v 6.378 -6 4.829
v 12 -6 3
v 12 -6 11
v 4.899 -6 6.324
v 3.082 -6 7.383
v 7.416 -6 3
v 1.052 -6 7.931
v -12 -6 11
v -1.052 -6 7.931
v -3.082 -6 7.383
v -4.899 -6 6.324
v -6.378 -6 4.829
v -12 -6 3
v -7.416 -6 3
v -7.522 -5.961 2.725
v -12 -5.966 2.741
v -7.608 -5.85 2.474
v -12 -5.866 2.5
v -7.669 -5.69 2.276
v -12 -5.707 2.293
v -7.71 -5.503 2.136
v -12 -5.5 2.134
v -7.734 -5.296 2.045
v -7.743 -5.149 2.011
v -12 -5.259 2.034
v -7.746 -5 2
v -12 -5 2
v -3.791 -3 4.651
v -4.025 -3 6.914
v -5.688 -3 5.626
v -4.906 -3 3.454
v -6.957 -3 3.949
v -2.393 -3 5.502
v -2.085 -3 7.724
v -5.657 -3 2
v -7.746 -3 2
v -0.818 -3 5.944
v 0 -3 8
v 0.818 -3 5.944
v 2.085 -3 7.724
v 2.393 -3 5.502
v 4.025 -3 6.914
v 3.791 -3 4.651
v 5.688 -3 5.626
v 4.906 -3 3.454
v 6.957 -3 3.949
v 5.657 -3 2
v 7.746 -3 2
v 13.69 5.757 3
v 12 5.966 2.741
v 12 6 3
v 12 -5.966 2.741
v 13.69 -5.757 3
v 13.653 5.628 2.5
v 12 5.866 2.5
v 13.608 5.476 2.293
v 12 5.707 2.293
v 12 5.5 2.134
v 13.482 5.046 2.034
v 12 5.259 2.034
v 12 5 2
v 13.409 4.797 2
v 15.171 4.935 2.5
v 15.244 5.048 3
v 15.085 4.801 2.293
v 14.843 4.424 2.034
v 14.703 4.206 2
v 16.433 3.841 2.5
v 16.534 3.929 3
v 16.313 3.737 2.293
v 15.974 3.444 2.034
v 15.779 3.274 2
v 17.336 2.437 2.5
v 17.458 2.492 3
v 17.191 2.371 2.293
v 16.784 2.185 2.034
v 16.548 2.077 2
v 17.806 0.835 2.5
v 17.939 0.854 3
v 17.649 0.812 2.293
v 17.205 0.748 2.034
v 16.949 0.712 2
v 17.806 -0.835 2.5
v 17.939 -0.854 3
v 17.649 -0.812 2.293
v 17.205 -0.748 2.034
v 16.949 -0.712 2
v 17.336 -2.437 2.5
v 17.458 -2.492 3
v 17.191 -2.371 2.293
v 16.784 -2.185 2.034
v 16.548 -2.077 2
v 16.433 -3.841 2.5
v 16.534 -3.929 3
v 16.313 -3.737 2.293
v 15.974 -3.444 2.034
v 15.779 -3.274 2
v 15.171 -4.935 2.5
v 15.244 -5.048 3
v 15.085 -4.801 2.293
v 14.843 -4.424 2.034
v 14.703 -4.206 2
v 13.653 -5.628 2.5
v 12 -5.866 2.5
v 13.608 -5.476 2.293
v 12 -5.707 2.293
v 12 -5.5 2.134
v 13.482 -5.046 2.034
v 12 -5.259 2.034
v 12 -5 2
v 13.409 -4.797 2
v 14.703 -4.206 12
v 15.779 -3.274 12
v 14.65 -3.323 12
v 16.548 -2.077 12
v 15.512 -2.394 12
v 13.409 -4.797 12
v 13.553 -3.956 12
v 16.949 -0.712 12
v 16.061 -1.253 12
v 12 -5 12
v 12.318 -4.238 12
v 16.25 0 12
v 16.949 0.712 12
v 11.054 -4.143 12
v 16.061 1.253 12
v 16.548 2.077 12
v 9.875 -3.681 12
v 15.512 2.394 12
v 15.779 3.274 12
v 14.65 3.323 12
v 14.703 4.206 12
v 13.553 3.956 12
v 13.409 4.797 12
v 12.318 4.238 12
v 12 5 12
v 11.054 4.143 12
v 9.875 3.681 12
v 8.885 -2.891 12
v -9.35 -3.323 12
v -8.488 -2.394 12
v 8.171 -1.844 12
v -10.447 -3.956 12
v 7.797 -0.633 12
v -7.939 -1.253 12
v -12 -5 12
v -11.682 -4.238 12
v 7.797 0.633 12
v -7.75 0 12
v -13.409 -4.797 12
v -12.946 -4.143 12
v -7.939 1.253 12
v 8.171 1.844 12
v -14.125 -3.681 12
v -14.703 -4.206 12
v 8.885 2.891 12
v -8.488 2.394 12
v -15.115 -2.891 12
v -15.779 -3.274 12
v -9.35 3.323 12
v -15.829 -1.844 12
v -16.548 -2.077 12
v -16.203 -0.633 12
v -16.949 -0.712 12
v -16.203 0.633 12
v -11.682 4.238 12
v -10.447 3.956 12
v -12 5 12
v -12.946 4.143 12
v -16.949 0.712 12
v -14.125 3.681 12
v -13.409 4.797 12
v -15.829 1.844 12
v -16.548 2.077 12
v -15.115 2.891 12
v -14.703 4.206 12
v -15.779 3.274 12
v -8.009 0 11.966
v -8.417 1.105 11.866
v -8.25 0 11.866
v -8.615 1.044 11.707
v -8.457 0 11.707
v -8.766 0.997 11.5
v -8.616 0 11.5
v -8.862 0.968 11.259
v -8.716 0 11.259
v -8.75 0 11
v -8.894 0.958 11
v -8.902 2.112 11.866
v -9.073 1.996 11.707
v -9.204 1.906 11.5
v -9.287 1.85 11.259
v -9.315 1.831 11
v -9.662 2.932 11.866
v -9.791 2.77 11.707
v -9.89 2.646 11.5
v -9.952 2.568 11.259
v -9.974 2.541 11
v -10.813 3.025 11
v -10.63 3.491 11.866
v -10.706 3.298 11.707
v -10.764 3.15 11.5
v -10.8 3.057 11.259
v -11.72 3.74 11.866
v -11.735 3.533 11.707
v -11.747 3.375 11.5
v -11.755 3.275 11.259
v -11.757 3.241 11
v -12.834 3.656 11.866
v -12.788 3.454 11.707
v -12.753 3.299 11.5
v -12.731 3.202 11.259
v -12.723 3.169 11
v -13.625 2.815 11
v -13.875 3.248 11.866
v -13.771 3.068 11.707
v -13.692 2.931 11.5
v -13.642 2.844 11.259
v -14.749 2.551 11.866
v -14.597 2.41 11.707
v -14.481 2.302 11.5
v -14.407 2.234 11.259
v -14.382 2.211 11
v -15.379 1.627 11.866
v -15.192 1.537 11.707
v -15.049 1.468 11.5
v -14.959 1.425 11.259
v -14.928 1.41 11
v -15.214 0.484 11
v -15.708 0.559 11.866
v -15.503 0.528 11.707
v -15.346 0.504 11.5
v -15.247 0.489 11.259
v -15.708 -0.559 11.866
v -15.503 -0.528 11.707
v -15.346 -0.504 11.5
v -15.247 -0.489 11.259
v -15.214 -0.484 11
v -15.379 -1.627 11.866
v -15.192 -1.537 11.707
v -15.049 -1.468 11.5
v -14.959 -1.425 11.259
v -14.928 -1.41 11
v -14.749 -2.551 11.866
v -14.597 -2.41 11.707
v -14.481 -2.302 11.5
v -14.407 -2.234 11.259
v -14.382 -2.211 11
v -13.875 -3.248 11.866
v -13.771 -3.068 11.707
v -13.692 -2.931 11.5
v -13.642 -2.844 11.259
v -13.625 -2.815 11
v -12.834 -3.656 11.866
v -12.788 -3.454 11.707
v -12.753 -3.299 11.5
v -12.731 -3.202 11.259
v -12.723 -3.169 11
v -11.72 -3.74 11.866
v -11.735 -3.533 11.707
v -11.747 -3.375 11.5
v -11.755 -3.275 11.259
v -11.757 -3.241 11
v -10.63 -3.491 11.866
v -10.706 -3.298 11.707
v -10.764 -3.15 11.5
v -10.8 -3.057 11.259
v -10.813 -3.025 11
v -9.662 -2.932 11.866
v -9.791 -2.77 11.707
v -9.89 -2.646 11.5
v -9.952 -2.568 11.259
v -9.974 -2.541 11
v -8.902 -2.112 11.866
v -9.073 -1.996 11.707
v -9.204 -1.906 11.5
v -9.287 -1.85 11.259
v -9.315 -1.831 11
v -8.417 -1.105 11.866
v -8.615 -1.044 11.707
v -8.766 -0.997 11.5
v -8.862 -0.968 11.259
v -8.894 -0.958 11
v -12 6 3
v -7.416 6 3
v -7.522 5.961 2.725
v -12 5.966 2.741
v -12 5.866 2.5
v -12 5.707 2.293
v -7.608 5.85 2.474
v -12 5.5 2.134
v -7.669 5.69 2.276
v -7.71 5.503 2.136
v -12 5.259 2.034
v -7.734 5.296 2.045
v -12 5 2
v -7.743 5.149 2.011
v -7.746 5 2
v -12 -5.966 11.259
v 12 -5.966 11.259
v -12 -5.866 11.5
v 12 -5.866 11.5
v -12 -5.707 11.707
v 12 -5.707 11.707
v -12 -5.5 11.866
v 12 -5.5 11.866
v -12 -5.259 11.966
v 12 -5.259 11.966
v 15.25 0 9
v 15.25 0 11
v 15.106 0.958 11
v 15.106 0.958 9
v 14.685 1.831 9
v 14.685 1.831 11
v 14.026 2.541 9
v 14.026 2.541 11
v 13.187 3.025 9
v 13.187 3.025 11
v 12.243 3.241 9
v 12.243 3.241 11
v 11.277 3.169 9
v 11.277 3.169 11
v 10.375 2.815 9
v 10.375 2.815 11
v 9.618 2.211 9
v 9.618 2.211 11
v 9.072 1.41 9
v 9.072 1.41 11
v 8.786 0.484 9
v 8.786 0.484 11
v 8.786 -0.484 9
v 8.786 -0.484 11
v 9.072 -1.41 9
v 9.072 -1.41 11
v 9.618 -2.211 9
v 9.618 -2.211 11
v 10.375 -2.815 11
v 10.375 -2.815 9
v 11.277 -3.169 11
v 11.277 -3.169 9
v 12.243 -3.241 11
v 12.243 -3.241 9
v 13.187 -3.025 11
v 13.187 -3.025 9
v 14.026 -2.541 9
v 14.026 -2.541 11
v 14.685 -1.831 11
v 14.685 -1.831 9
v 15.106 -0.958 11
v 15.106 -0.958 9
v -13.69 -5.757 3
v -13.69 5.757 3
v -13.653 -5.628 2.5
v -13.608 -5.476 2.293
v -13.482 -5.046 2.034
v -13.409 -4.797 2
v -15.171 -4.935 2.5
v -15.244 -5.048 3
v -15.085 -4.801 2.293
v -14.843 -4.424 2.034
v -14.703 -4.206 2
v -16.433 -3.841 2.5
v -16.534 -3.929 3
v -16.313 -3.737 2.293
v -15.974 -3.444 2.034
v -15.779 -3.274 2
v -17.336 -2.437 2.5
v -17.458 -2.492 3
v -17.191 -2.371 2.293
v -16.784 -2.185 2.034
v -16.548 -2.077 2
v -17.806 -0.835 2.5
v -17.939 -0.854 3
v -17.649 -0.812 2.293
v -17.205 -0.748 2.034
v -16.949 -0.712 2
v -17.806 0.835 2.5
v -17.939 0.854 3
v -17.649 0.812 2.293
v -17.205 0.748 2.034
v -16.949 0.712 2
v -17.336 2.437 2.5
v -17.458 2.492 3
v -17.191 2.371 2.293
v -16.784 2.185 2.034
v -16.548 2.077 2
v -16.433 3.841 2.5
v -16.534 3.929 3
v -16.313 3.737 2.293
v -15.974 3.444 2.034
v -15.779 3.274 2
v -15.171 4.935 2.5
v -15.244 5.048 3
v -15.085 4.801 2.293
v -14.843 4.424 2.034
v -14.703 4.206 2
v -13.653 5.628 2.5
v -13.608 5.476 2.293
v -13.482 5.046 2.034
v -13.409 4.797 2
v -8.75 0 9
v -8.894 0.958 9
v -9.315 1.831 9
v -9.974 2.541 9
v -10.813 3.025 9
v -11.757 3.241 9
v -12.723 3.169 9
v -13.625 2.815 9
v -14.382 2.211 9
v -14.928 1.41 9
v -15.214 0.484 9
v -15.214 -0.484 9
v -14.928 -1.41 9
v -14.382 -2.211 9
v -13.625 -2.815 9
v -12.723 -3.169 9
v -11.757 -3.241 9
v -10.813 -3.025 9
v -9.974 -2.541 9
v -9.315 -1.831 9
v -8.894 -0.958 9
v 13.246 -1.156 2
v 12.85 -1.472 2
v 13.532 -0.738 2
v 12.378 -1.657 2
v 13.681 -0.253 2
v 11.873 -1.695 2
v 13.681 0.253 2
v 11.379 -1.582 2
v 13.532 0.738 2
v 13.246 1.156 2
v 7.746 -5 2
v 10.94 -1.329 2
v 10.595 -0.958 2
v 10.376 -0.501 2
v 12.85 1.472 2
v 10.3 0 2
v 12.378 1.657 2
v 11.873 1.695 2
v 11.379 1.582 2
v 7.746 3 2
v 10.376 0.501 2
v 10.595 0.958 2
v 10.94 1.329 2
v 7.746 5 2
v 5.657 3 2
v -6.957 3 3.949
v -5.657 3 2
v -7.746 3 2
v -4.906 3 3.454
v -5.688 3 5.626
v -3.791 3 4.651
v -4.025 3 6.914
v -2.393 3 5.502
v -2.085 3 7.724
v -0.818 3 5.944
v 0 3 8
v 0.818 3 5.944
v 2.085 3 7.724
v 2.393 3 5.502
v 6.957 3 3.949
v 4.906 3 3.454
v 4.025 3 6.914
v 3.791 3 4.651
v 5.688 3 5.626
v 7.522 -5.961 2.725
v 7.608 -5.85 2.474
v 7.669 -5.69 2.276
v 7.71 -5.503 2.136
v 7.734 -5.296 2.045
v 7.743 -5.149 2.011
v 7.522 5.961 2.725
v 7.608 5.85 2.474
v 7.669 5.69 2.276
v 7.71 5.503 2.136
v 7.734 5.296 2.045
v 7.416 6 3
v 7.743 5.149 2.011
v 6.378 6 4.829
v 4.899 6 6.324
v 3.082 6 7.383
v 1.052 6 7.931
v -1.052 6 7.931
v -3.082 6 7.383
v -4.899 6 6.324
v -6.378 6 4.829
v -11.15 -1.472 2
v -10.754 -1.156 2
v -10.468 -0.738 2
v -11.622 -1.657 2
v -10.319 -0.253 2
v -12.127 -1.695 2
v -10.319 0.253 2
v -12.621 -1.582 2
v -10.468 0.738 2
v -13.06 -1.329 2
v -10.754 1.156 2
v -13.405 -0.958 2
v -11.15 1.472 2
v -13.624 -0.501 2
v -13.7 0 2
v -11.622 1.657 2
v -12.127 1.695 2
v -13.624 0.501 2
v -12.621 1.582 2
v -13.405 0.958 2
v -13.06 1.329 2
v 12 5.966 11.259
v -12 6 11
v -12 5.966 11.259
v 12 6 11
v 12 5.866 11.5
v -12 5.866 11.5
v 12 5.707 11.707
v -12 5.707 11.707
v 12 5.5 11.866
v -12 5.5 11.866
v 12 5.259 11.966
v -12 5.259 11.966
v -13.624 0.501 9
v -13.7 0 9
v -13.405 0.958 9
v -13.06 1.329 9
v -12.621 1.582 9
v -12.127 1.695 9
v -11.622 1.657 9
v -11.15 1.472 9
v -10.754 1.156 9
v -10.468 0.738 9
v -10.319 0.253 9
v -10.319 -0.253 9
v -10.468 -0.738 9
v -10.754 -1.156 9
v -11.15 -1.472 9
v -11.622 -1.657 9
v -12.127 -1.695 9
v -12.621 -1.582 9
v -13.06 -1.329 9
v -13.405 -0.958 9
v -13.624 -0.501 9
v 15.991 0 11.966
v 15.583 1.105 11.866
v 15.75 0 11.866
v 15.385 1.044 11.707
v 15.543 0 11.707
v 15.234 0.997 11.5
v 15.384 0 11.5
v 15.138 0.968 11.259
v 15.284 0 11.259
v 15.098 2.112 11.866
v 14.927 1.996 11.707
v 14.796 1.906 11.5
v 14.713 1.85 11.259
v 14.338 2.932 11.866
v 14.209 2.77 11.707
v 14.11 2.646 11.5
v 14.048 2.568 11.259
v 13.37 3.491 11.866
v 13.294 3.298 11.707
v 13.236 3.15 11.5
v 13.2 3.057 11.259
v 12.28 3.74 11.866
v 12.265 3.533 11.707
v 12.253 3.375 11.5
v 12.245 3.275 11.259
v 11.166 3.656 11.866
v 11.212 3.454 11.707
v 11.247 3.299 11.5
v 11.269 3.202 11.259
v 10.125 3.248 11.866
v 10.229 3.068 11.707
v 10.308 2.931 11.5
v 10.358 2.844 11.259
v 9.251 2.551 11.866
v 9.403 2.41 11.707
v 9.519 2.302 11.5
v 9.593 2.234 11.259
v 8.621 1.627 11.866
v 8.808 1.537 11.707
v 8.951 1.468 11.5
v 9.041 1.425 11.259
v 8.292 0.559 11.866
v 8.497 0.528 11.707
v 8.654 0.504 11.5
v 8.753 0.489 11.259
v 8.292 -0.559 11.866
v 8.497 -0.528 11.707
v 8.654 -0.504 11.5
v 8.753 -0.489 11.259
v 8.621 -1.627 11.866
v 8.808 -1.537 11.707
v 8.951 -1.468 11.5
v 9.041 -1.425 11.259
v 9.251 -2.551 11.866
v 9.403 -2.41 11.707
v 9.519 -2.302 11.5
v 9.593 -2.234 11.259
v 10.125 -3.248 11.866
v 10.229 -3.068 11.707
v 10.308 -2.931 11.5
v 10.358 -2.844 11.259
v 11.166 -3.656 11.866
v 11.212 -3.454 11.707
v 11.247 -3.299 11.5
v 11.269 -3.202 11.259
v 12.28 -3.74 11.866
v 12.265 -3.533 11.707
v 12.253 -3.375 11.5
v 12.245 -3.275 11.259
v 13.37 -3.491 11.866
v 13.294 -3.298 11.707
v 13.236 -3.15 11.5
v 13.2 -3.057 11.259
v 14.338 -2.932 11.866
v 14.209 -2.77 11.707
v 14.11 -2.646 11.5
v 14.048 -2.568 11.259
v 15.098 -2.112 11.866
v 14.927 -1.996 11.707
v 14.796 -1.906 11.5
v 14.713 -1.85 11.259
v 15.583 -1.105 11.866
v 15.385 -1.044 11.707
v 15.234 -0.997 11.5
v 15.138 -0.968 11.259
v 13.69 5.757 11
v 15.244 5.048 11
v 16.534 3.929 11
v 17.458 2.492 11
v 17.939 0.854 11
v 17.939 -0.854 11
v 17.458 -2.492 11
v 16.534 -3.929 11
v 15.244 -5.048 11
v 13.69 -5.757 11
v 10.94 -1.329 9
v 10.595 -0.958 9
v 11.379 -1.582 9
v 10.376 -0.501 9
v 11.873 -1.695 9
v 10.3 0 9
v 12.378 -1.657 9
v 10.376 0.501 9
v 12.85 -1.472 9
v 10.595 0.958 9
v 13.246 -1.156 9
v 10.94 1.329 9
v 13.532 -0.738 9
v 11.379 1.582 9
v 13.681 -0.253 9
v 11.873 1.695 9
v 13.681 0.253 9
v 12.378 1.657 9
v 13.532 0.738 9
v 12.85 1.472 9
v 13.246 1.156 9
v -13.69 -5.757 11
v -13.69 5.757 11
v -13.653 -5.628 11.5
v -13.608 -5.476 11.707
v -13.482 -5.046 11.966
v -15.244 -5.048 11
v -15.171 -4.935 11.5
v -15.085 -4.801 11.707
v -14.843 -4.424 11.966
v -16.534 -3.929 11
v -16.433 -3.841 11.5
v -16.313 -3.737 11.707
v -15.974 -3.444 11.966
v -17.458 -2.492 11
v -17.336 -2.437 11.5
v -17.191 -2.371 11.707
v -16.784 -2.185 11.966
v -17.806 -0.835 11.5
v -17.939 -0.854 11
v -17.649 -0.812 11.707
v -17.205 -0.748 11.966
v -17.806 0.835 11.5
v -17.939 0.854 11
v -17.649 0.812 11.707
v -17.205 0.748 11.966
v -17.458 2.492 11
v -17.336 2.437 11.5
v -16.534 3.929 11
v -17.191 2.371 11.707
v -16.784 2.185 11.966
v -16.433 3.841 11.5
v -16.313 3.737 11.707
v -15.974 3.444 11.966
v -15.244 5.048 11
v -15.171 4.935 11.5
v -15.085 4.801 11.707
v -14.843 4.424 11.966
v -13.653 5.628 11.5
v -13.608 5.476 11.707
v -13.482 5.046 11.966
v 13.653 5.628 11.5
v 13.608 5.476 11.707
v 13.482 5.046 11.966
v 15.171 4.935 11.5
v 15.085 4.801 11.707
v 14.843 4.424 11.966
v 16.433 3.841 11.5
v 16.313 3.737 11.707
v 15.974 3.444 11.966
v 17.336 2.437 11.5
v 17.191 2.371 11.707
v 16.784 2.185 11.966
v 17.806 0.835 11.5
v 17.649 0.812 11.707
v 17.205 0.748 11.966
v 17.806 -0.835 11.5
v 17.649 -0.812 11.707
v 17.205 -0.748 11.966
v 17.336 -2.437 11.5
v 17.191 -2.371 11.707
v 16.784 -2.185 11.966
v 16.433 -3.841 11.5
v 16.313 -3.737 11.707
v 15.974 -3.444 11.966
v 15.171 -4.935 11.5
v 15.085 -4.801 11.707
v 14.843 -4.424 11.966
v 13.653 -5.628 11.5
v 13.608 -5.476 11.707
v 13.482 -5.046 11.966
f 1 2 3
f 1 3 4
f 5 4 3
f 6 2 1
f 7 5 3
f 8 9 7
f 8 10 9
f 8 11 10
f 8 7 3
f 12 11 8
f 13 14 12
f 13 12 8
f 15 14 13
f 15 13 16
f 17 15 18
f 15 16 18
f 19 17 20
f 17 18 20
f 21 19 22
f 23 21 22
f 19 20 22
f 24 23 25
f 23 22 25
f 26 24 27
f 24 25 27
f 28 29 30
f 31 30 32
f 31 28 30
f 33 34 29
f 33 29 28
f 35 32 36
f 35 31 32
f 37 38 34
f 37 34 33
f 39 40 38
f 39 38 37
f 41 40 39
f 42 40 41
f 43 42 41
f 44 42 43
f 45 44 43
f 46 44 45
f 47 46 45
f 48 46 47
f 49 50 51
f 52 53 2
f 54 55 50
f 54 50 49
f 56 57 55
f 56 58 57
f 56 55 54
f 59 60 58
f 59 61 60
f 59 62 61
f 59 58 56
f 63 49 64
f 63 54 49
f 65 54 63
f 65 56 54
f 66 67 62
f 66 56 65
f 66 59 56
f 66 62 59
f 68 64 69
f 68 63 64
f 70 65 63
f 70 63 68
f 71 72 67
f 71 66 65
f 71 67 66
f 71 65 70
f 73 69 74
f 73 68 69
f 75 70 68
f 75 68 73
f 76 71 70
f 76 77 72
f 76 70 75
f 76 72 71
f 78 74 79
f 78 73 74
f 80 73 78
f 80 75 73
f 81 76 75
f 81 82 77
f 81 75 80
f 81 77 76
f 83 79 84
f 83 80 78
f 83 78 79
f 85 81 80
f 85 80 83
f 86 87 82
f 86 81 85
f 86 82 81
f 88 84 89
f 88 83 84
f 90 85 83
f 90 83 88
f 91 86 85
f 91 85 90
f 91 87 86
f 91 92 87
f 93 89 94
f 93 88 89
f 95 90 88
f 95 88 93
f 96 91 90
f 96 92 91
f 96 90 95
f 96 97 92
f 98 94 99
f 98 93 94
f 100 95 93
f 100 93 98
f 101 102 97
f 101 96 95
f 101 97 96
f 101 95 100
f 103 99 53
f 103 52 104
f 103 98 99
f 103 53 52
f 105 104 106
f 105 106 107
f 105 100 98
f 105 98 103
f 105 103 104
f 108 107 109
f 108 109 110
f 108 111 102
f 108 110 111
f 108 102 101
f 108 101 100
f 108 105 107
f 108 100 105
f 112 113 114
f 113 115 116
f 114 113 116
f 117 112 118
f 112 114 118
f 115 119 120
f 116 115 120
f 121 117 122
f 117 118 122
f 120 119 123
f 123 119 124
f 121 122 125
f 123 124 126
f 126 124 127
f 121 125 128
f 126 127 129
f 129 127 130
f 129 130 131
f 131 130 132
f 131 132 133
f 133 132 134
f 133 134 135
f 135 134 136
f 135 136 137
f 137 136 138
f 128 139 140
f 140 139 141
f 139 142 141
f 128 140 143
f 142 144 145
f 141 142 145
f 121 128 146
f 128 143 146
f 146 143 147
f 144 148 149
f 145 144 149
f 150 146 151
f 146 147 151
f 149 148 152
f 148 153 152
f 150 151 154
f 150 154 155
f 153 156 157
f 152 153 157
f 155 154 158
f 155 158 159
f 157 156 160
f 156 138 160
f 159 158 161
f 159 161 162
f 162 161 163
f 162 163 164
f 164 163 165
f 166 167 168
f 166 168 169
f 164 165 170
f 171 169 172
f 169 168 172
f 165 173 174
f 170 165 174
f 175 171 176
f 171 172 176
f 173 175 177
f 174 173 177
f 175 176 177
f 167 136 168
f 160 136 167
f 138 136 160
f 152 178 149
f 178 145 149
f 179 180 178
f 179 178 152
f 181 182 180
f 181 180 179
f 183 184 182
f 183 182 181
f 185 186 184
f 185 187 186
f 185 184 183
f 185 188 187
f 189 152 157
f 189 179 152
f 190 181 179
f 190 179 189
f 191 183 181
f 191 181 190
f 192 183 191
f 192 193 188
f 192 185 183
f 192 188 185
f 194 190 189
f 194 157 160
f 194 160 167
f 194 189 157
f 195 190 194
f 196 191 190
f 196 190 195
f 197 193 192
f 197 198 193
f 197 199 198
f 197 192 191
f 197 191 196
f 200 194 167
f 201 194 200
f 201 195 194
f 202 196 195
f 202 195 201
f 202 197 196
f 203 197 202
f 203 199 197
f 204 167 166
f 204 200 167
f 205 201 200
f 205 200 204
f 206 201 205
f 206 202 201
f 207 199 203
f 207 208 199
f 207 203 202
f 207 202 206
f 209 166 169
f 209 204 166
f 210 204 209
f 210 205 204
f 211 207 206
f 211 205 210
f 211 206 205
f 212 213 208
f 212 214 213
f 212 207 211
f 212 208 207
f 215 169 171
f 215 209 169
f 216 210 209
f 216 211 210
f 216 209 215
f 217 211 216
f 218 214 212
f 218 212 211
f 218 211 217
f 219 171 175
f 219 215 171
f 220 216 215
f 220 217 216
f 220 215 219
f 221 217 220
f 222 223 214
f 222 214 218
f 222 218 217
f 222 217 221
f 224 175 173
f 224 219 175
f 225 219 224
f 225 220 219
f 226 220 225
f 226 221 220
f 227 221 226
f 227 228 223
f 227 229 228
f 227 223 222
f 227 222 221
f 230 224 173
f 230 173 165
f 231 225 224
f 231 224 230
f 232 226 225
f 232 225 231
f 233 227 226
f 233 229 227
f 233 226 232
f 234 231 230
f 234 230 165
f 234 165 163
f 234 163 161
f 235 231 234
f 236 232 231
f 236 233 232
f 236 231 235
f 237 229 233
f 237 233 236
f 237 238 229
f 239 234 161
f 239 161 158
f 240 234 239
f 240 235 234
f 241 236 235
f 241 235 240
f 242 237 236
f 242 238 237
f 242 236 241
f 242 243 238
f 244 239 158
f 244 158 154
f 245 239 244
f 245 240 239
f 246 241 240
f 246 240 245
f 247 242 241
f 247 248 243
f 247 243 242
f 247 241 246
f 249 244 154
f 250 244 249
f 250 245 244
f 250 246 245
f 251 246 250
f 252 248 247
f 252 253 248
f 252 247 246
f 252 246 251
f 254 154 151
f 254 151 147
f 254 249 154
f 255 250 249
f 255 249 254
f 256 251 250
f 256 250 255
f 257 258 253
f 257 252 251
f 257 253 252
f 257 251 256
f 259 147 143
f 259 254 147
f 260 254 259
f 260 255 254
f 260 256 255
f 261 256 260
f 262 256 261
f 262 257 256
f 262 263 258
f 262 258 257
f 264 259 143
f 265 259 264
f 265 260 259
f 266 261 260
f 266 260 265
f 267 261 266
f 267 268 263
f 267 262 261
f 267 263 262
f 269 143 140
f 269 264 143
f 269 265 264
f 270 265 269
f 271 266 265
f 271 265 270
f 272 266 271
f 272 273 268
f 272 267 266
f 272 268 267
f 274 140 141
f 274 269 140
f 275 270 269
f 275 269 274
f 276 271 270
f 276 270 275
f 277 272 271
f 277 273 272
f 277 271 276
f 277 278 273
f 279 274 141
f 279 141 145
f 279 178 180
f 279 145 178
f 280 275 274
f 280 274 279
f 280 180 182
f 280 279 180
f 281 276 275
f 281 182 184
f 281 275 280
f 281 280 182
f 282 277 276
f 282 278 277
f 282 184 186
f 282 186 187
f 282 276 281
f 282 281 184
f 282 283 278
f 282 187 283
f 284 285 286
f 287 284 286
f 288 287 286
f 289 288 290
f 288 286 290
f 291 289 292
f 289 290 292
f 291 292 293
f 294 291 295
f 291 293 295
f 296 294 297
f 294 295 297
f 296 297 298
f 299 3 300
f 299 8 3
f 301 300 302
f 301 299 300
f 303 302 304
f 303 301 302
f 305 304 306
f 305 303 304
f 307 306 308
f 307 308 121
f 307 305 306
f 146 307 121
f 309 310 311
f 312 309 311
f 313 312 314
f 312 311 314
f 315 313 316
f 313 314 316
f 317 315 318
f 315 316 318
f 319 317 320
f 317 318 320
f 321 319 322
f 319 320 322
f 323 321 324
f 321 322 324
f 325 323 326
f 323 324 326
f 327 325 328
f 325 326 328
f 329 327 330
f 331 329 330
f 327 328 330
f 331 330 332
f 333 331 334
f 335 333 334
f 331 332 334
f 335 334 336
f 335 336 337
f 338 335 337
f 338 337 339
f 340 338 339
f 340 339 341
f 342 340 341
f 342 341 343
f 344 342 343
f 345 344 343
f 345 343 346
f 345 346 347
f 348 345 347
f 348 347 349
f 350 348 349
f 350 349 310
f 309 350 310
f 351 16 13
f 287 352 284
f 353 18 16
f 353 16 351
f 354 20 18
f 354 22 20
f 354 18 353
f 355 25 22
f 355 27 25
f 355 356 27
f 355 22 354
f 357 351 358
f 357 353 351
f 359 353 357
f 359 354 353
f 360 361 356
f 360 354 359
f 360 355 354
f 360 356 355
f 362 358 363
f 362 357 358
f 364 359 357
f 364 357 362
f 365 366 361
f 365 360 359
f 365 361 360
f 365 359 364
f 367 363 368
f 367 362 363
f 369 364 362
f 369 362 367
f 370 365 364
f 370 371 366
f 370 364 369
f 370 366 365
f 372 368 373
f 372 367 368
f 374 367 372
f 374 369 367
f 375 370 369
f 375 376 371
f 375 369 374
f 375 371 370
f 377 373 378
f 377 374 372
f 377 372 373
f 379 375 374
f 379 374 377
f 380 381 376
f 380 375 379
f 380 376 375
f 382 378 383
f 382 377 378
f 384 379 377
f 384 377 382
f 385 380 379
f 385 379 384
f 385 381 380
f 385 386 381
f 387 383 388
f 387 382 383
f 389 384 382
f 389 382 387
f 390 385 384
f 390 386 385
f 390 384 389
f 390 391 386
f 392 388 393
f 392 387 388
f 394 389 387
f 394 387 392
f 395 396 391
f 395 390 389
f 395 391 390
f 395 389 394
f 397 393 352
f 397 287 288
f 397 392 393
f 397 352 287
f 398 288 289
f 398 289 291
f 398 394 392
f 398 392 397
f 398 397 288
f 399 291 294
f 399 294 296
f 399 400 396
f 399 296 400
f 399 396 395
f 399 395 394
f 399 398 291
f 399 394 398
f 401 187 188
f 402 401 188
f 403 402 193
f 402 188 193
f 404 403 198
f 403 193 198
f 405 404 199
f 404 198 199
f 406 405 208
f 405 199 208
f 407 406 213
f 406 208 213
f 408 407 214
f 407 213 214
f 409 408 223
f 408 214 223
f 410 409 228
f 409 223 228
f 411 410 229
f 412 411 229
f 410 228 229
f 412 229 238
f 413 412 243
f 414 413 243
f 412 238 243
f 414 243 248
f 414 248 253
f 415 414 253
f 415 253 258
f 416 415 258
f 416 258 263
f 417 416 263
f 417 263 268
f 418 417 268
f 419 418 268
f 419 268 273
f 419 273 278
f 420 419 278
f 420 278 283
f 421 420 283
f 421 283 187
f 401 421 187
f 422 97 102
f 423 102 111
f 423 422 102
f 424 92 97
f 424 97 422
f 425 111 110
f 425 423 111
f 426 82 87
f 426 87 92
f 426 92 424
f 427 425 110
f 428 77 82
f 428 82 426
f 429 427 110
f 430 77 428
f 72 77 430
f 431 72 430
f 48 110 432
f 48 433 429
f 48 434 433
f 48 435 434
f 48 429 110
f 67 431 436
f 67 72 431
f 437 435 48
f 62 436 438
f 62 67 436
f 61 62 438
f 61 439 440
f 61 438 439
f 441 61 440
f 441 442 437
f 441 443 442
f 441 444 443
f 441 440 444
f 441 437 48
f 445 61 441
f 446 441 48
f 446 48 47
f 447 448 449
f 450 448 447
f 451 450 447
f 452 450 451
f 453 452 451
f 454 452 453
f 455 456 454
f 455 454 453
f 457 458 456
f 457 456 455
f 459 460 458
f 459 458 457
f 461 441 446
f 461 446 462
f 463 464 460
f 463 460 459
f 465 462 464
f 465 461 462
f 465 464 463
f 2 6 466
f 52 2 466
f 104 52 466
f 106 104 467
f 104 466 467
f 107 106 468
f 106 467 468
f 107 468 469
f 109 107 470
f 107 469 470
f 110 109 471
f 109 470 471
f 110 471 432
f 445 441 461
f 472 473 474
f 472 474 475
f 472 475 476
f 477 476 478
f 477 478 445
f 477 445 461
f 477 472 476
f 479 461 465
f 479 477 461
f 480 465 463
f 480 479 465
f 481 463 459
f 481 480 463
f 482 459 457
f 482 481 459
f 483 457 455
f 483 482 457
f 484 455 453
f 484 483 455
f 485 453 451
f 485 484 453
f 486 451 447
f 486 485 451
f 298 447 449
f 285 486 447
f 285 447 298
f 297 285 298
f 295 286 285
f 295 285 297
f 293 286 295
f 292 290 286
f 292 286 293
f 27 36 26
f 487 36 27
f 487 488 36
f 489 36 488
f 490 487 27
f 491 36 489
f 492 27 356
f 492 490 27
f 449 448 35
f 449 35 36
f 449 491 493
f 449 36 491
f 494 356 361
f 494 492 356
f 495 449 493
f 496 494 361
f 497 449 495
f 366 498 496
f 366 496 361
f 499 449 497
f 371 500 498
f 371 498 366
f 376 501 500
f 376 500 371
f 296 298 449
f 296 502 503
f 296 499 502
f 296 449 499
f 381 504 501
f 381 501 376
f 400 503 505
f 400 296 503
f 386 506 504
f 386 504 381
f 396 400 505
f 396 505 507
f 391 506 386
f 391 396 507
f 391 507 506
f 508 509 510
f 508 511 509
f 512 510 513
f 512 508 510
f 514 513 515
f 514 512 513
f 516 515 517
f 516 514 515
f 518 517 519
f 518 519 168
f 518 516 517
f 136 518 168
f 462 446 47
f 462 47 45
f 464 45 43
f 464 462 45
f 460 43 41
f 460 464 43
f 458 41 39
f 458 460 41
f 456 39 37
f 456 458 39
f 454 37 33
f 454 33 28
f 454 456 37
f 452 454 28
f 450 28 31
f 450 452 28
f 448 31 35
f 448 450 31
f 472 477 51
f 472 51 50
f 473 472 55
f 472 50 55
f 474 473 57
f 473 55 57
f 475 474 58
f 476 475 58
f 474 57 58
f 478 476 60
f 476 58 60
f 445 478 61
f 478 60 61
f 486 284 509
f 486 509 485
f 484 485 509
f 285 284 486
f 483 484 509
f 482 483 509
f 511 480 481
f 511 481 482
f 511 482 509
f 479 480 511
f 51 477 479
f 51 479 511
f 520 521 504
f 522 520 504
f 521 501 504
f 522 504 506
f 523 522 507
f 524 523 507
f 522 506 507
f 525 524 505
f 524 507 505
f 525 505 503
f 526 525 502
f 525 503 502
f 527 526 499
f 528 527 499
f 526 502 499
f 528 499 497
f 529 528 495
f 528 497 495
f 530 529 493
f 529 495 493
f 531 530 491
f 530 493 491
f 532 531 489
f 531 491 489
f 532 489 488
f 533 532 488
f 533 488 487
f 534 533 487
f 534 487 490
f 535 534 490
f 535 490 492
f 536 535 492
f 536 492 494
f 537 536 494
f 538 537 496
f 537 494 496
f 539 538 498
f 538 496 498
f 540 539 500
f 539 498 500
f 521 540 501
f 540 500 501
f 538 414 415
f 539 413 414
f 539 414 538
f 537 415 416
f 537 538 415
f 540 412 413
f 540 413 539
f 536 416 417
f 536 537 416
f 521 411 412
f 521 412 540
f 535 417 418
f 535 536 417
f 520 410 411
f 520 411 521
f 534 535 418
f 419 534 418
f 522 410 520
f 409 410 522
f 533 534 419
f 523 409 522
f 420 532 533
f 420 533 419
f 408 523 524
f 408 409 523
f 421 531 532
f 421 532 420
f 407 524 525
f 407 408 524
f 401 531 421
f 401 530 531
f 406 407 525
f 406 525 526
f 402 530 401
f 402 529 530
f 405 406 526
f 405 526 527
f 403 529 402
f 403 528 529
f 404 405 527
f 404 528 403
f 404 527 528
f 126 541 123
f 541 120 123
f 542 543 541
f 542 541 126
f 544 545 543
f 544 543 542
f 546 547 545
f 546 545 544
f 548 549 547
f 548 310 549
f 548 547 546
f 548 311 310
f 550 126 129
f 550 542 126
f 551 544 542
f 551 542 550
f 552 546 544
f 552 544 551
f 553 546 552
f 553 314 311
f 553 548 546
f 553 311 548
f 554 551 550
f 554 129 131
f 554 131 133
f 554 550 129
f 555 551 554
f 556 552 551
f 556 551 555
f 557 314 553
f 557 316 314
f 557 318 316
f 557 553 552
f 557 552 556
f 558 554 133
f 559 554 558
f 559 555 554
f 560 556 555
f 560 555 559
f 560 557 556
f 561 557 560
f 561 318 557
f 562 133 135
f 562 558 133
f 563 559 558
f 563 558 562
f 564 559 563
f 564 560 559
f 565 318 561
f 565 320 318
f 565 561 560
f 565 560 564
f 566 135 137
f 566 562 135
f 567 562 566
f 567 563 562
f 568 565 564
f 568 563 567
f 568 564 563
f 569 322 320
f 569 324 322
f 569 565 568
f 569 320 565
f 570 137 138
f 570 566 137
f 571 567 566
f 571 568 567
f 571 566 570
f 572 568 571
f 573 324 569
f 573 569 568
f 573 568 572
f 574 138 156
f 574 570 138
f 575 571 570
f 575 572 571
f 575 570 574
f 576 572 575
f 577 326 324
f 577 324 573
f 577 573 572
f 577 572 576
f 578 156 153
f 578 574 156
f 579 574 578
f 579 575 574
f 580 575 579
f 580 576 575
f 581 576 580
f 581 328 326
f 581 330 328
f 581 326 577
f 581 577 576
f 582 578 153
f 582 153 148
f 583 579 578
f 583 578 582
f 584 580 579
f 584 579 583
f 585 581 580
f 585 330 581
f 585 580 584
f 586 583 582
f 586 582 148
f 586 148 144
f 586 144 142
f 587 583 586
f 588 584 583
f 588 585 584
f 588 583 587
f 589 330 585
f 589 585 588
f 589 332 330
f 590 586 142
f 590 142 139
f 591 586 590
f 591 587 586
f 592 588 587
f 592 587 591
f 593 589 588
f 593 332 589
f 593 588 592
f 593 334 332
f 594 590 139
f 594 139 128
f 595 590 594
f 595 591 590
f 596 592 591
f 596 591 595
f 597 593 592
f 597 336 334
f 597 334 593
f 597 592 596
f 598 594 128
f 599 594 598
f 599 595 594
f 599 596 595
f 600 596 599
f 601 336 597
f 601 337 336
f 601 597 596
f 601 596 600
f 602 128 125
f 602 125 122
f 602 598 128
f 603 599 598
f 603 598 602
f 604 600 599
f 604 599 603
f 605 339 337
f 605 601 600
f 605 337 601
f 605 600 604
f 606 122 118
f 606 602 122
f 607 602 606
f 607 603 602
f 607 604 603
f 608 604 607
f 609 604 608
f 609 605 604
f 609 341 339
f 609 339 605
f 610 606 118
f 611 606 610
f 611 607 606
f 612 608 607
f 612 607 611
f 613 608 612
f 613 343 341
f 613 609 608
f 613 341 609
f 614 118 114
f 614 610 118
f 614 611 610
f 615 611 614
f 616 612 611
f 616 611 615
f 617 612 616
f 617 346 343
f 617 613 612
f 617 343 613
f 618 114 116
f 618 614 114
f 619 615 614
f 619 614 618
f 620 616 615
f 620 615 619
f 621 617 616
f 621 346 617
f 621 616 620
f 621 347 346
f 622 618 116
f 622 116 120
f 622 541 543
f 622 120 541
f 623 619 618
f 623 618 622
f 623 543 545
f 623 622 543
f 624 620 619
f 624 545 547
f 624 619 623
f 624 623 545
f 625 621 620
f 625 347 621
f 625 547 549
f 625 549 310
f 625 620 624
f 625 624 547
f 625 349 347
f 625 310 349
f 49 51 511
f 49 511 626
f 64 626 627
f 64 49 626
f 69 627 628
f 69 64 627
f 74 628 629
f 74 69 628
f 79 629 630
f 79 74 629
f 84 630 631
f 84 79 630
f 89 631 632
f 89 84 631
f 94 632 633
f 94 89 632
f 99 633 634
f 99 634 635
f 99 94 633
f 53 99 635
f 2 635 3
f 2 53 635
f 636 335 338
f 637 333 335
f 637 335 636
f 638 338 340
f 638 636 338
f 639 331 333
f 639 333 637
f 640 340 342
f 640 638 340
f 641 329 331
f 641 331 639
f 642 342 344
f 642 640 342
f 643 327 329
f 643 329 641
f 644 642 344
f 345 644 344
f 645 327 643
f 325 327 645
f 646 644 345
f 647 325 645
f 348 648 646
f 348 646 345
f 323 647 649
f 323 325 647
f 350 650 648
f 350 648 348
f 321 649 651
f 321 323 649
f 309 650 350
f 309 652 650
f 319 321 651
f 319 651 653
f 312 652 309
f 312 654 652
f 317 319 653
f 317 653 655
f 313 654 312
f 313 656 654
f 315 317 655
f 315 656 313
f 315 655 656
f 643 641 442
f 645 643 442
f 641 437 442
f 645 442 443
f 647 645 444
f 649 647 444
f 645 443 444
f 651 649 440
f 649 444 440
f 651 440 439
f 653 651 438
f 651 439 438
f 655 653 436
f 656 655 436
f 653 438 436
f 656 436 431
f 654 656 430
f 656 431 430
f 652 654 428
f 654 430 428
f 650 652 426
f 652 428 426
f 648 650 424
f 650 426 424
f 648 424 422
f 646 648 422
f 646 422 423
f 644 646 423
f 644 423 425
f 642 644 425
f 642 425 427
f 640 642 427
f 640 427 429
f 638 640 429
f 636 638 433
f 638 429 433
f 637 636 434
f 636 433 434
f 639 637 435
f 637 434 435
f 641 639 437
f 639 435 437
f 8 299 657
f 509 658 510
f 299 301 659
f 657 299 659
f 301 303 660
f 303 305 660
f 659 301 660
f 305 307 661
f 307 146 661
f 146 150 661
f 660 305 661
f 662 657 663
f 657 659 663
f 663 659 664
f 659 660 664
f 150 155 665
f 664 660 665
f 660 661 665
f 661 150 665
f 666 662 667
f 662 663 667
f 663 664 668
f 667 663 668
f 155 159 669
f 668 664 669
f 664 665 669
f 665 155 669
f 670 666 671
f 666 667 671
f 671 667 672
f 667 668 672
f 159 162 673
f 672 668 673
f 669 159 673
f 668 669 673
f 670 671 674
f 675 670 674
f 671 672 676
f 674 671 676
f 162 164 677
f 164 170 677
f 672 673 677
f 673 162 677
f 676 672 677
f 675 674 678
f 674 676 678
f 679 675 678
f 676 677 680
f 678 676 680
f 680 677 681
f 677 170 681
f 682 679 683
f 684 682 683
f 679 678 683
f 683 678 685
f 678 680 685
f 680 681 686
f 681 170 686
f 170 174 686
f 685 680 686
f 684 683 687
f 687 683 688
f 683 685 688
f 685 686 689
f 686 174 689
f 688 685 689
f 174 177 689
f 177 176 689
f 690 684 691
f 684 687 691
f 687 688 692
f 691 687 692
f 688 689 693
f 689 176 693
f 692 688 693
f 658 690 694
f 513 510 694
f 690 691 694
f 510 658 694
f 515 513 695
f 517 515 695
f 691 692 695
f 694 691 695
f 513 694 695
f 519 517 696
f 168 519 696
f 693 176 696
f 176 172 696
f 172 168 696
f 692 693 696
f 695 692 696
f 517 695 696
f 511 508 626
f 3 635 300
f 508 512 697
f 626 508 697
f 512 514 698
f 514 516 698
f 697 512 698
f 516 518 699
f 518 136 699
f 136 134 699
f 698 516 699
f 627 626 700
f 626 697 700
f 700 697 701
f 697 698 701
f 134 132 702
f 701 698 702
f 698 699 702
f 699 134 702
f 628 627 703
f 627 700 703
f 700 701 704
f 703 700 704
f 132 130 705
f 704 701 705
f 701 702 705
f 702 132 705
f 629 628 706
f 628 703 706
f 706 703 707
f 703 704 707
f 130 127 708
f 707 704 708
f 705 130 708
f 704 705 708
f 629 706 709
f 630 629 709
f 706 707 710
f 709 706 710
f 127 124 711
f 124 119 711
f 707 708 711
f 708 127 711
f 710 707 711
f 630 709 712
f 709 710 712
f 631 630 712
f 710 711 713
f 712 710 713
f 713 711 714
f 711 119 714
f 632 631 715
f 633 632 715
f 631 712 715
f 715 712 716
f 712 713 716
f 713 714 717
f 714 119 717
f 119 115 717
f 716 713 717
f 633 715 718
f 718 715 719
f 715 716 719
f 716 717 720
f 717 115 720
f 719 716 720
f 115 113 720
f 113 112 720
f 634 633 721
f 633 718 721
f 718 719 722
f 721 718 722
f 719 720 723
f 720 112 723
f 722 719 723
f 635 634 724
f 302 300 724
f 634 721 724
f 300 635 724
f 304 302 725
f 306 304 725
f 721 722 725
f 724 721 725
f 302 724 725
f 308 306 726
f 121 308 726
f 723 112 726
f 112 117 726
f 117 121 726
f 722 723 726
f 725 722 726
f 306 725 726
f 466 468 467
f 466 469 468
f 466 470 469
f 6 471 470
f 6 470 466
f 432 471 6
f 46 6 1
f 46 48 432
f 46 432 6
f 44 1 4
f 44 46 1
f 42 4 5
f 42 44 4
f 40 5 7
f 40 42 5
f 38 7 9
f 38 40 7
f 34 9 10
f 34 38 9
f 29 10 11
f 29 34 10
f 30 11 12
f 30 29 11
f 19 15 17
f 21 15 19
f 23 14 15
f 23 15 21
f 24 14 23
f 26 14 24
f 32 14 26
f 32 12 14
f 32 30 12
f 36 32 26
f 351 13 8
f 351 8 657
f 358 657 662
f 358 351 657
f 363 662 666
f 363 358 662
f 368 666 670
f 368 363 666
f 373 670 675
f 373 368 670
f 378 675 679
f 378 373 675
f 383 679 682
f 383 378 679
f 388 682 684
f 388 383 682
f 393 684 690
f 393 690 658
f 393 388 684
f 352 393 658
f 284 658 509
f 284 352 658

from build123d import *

# Parameters (mm, degrees)
BOSS_EXTRUDE1_START            = 2
BOSS_EXTRUDE1_DEPTH            = 10
CBORE_FOR_M3_SHCS2_D           = 3.4
CBORE_FOR_M3_SHCS2_CBORE_D     = 6.5
CBORE_FOR_M3_SHCS2_CBORE_DEPTH = 3
FILLET1_R                      = 1


with BuildPart() as part:
    # Sketch1 → Boss-Extrude1 (new body)
    with BuildSketch(Plane.XY.offset(BOSS_EXTRUDE1_START)):
        with BuildLine():
            Line((-12, 6), (12, 6))
            ThreePointArc((12, 6), (18, 0), (12, -6))
            Line((12, -6), (-12, -6))
            ThreePointArc((-12, -6), (-18, 0), (-12, 6))
        make_face()
    extrude(amount=BOSS_EXTRUDE1_DEPTH)

    # CBORE for M3 SHCS2 (through all)
    with Locations(Plane.XY.offset(12)):
        with Locations((-12, 0), (12, 0)):
            CounterBoreHole(CBORE_FOR_M3_SHCS2_D / 2, CBORE_FOR_M3_SHCS2_CBORE_D / 2, CBORE_FOR_M3_SHCS2_CBORE_DEPTH)

    # Fillet1
    fillet1_edges = [part.edges().sort_by_distance(p)[0] for p in [
        (18, 0, 12),
        (0, 6, 12),
        (8.75, 0, 12),
        (-15.25, 0, 12),
        (-18, 0, 12),
        (0, 6, 2),
        (18, 0, 2),
        (0, -6, 2),
        (-18, 0, 2),
        (0, -6, 12),
    ]]
    fillet(fillet1_edges, radius=FILLET1_R)

    # Sketch13 → Cut-Revolve1 (revolve, cut)
    with BuildSketch(Plane(origin=(0, 0, 0), x_dir=(0, 0, -1), z_dir=(1, 0, 0))):
        Polygon((0, 6), (0, -6), (8, -6), (8, -3), (6, -3), (6, 3), (8, 3), (8, 6), align=None)
    revolve(axis=Axis((0, 6, 0), (0, -1, 0)), mode=Mode.SUBTRACT)


solid = part.part
